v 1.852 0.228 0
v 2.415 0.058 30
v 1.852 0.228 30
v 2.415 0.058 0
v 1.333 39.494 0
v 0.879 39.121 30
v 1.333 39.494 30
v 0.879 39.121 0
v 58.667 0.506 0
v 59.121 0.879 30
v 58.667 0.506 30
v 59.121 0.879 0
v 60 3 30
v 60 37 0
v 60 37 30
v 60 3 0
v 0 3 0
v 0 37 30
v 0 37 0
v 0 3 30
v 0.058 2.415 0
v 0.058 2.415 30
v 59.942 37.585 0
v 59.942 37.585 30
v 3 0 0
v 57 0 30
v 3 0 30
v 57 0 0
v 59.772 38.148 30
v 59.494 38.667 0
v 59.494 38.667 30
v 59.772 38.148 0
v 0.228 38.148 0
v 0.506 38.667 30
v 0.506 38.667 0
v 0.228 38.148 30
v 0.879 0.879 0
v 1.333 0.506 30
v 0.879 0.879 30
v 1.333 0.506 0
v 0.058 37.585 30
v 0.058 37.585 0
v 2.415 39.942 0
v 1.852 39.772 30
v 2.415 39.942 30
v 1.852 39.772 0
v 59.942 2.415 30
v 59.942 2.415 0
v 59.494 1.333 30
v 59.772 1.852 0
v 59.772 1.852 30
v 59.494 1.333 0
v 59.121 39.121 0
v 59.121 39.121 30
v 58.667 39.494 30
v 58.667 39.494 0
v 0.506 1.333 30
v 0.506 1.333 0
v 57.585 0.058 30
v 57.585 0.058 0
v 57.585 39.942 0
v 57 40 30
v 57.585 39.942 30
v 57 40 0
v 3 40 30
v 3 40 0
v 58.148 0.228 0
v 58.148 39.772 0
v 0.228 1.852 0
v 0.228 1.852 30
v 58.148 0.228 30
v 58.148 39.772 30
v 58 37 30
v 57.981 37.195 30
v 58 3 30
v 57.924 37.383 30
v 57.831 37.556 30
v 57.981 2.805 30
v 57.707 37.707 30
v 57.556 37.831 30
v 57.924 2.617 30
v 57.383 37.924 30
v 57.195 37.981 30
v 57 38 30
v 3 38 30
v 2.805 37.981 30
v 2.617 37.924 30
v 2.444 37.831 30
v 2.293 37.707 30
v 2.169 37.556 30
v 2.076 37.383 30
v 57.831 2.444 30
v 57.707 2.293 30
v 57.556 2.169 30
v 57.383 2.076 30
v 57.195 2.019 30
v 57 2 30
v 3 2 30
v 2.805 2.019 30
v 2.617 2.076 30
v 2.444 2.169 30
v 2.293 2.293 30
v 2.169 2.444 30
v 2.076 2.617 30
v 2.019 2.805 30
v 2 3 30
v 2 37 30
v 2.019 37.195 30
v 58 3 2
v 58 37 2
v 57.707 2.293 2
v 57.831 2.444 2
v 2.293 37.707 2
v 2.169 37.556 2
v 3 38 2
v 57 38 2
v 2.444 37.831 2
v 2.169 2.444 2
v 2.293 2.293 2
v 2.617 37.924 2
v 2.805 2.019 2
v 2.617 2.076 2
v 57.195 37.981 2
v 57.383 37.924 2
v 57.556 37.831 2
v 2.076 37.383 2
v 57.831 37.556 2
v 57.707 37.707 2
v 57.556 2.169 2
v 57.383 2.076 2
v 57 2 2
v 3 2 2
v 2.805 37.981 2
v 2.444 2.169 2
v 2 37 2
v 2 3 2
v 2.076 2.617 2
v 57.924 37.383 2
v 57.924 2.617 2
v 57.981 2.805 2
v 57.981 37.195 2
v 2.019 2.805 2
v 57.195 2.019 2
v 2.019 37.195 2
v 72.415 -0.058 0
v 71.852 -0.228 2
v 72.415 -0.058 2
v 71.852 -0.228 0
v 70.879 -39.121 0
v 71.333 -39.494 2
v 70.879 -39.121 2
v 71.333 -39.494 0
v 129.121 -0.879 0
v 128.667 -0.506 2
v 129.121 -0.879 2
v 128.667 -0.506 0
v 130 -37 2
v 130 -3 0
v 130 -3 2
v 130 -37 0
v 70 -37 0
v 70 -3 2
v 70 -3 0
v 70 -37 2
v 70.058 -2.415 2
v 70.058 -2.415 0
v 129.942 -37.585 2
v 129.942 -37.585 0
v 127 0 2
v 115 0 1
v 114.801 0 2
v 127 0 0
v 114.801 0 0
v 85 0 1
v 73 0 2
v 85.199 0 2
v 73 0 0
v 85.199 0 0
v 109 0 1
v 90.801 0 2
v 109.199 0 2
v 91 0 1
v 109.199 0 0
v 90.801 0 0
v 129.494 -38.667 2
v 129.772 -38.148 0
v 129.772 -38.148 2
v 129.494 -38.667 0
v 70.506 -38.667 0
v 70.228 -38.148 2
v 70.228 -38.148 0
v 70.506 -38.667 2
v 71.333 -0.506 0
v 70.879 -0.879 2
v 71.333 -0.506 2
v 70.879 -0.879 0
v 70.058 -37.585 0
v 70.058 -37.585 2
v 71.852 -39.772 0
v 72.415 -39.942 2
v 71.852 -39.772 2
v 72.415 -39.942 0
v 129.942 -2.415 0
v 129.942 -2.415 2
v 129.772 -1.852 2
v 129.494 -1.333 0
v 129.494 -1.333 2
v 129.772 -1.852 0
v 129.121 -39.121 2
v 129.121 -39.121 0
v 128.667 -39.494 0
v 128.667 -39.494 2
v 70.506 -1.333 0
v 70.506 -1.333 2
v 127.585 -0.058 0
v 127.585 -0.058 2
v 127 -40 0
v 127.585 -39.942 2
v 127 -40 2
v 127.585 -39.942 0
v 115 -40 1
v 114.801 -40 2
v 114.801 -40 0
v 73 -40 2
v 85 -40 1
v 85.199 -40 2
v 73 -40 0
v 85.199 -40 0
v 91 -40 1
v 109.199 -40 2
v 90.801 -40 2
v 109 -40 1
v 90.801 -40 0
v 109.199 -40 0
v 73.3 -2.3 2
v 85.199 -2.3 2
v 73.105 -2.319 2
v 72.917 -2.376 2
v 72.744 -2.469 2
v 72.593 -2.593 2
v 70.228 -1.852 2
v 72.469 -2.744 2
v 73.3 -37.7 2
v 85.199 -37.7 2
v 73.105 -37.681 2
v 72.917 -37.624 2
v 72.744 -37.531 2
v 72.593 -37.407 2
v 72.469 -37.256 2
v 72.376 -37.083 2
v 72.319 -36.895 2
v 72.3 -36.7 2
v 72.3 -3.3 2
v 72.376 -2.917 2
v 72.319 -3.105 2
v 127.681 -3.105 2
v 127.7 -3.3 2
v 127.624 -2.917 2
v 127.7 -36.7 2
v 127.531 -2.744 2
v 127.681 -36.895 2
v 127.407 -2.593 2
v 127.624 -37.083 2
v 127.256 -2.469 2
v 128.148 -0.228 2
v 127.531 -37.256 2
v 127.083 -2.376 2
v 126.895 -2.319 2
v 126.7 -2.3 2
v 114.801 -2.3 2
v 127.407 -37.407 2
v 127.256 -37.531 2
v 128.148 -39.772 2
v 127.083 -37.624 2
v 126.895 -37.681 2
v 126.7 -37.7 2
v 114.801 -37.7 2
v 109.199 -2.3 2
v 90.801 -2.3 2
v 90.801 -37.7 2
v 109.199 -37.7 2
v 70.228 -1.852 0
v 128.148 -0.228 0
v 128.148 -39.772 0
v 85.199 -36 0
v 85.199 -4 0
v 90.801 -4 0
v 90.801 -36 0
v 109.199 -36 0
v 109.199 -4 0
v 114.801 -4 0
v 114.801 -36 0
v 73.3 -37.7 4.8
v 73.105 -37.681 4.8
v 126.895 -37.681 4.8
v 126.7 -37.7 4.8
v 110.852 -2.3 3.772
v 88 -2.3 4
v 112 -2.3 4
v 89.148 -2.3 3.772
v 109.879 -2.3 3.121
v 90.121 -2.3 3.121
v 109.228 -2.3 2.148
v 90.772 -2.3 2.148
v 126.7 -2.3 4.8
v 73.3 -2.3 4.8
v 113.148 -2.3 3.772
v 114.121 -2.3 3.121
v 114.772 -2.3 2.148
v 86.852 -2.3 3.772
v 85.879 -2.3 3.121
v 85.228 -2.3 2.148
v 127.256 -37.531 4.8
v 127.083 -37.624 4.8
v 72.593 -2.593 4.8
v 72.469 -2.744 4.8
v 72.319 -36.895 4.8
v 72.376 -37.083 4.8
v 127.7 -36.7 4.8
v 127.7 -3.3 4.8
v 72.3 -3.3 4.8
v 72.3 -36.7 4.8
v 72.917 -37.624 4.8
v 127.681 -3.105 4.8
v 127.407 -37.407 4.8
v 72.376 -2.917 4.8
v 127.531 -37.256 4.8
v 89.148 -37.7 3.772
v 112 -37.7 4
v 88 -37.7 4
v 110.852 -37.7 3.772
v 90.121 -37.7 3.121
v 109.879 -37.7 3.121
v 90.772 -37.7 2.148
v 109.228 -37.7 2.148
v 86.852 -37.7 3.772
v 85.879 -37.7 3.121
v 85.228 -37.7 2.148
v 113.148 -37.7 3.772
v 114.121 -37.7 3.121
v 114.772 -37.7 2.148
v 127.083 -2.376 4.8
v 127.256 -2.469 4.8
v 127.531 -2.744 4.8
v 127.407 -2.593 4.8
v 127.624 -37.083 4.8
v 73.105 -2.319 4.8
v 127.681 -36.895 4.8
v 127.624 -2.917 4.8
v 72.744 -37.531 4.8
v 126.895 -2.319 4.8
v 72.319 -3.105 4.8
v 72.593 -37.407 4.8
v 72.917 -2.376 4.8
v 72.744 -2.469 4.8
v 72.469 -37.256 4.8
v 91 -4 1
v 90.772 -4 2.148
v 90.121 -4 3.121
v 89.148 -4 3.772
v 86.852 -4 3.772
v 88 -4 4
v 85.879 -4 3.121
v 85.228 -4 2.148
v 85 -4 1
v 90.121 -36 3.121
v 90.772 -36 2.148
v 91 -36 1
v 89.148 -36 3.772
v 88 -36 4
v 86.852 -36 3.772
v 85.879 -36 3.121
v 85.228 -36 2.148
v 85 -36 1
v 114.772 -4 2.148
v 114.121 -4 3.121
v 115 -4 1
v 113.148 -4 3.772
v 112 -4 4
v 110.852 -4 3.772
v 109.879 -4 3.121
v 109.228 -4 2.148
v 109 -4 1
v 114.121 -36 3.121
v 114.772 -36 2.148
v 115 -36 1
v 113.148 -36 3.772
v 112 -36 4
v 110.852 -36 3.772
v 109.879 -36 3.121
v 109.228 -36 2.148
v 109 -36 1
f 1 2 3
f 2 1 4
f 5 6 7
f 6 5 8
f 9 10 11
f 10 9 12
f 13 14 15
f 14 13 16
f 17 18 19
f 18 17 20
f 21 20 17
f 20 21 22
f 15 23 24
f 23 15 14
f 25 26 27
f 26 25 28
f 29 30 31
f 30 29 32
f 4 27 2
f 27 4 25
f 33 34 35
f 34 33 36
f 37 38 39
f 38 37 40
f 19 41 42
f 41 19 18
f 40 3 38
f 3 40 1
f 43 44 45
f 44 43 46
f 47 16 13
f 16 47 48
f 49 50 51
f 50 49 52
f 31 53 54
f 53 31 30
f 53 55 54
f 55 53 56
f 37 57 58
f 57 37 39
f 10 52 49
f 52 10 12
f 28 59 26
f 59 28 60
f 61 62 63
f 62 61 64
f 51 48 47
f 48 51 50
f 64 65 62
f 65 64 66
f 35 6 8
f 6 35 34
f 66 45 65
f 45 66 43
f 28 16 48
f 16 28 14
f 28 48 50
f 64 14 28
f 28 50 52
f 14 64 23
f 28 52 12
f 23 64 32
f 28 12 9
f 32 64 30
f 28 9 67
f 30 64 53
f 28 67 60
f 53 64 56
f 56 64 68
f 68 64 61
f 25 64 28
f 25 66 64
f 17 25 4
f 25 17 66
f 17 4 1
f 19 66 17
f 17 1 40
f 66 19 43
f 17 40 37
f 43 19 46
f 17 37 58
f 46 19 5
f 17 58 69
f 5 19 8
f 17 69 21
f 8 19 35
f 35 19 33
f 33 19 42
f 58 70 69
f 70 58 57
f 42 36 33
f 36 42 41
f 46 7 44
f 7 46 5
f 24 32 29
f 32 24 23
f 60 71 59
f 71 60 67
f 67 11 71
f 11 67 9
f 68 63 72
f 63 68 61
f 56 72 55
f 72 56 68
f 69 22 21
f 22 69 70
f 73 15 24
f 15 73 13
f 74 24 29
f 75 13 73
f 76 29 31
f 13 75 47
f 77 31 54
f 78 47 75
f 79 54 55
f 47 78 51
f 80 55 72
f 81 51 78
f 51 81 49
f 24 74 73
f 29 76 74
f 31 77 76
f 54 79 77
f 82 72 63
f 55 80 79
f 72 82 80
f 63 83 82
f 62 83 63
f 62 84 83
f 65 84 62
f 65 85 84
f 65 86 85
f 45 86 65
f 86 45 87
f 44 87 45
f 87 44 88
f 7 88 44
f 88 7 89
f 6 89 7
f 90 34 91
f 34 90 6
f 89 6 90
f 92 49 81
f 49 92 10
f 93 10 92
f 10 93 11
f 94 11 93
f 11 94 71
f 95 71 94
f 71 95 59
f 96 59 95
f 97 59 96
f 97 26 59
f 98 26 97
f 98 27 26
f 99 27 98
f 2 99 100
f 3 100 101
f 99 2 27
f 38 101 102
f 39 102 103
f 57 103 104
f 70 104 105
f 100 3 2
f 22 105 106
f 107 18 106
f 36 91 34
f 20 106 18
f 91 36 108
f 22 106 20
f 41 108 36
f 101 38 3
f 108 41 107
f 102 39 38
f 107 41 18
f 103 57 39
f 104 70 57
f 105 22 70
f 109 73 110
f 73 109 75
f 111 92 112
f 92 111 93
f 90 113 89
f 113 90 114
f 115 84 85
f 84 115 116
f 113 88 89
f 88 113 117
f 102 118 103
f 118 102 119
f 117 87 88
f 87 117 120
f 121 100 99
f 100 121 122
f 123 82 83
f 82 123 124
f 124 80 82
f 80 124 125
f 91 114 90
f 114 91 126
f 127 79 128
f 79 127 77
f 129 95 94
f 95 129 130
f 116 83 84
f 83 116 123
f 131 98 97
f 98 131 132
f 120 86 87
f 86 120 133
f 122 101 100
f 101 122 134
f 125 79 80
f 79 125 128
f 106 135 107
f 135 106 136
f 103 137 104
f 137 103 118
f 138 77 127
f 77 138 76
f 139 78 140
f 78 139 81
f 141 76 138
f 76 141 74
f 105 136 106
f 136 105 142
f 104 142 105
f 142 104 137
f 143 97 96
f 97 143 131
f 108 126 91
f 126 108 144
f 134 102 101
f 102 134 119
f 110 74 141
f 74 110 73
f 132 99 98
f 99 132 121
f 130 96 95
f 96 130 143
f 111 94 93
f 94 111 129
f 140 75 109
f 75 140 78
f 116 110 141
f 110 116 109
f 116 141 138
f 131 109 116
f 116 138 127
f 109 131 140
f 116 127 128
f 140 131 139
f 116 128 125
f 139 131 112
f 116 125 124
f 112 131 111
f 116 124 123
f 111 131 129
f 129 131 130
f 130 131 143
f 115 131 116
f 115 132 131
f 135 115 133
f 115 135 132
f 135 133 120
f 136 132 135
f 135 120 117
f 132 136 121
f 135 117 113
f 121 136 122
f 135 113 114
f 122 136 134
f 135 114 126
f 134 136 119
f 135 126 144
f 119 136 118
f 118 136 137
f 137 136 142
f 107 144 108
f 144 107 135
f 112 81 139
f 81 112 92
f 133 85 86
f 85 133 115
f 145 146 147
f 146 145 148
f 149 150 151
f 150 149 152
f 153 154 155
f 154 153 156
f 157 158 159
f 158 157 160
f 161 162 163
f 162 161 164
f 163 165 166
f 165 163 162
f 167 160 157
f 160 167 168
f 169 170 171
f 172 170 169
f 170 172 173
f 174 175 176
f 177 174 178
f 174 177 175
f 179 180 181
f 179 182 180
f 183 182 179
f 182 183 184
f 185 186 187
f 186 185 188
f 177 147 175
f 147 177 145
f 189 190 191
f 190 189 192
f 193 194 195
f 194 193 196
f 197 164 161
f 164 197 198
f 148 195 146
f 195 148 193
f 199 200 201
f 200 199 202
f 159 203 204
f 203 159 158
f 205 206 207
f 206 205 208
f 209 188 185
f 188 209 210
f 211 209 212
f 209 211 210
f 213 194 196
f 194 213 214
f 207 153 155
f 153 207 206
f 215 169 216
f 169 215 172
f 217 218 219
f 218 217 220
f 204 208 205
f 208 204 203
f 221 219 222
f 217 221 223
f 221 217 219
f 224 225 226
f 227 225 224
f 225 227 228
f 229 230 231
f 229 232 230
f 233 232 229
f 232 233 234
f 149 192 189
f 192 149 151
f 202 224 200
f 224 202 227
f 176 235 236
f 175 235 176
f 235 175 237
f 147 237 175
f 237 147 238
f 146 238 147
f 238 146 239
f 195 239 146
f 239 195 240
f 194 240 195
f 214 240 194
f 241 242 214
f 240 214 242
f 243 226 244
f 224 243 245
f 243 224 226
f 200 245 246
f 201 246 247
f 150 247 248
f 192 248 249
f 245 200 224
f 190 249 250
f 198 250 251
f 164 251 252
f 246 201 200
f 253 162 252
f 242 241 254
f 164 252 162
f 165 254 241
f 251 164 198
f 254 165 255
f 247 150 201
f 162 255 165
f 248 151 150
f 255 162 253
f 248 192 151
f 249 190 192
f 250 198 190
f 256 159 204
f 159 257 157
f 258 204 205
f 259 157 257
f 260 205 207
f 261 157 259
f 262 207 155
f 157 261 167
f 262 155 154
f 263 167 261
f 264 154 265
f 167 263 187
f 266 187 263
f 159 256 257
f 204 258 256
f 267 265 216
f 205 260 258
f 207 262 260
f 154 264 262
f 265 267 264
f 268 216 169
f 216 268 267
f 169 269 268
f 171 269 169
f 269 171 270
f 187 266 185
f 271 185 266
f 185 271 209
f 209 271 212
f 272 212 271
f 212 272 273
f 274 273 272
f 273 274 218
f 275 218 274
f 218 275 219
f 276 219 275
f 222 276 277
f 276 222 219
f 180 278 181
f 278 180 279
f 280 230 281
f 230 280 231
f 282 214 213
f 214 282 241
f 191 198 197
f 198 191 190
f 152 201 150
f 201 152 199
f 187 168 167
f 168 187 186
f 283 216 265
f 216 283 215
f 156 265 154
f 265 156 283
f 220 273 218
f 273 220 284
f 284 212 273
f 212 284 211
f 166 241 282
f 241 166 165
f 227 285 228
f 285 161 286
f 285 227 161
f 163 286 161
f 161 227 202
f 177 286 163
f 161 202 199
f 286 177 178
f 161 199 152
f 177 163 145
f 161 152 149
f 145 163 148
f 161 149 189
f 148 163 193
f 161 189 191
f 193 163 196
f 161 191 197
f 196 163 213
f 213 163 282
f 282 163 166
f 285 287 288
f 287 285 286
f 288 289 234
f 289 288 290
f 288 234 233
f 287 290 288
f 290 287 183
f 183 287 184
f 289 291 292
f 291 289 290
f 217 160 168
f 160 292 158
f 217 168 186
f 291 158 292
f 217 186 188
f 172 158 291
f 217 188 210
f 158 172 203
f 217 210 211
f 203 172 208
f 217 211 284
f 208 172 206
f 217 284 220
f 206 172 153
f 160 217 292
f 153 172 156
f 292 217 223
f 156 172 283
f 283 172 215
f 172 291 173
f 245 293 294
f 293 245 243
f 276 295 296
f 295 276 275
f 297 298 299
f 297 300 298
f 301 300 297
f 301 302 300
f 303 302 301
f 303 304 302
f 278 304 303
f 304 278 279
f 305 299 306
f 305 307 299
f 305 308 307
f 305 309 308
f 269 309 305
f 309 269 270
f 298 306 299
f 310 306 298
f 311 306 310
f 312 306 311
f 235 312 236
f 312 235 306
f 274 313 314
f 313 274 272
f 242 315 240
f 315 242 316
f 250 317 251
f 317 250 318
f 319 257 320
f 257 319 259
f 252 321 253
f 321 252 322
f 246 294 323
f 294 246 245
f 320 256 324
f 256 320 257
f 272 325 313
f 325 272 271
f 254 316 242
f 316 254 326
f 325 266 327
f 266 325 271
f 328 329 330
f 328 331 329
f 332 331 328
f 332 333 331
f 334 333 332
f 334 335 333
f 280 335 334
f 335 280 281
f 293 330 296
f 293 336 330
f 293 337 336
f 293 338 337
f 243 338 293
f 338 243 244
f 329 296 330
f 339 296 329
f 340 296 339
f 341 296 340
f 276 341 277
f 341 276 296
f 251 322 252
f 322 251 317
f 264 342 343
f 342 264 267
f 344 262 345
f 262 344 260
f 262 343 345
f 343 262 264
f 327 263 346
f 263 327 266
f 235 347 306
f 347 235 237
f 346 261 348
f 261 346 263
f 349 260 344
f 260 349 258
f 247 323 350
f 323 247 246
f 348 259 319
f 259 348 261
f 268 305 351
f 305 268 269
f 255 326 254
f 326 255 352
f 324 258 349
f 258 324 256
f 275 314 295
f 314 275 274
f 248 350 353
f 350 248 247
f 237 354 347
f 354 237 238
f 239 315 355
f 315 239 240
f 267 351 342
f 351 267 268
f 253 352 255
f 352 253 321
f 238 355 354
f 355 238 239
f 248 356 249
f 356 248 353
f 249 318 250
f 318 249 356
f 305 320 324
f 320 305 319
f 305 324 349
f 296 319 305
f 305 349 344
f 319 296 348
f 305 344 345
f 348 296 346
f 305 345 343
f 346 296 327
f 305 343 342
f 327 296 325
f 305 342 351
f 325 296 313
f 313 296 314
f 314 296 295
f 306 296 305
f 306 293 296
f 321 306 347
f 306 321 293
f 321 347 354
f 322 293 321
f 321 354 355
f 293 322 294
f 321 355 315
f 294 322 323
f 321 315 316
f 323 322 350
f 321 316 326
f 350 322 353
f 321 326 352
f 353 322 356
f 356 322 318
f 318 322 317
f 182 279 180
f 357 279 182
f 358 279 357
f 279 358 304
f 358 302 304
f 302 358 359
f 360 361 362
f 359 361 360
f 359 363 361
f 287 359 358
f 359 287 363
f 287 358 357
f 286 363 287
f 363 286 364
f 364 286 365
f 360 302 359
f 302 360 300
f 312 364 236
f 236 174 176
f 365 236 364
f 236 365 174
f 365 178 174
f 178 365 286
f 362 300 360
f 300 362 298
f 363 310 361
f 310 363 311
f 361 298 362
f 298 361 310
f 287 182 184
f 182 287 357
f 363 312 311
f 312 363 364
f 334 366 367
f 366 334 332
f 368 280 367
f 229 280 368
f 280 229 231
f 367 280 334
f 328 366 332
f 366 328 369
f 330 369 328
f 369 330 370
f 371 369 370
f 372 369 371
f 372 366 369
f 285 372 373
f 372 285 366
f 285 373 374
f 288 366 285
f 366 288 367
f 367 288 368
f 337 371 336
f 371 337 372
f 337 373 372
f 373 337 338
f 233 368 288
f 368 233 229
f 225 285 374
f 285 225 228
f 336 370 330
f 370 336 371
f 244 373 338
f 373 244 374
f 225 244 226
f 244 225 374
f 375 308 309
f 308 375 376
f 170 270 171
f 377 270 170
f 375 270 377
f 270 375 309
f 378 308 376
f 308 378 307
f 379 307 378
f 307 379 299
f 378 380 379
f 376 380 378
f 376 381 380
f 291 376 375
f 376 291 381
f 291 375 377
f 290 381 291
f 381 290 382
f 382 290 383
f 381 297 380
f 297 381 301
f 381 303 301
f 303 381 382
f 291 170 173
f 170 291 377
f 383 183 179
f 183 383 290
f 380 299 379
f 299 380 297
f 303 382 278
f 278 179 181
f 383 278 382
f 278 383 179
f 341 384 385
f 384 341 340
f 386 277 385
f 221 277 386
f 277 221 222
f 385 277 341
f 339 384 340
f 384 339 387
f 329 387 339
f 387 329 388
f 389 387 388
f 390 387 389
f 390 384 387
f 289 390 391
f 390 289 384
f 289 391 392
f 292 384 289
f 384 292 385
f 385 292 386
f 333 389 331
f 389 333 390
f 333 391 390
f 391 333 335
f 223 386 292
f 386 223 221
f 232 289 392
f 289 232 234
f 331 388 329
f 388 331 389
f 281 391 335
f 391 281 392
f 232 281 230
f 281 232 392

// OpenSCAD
// Parametric Box with Lid
// A customizable storage box for 3D printing

// === Box Parameters ===
width = 60;              // [20:200] Width in mm
depth = 40;              // [20:200] Depth in mm
height = 30;             // [10:150] Height in mm
wall_thickness = 2;      // [1:0.5:5] Wall thickness in mm

// === Lid Parameters ===
include_lid = true;      // Include a separate lid
lid_height = 8;          // [5:30] Lid height in mm
lid_tolerance = 0.3;     // [0.1:0.1:0.8] Gap for lid fit

// === Style Options ===
corner_radius = 3;       // [0:10] Corner rounding radius
add_grip = true;         // Add grip indents to lid

// === Internal ===
$fn = 32;                // Smoothness

// Rounded box module
module rounded_box(w, d, h, r) {
    if (r > 0) {
        hull() {
            for (x = [r, w-r]) {
                for (y = [r, d-r]) {
                    translate([x, y, 0])
                        cylinder(h = h, r = r);
                }
            }
        }
    } else {
        cube([w, d, h]);
    }
}

// Main box body
module box_body() {
    difference() {
        rounded_box(width, depth, height, corner_radius);

        // Hollow inside
        translate([wall_thickness, wall_thickness, wall_thickness])
            rounded_box(
                width - 2*wall_thickness,
                depth - 2*wall_thickness,
                height,  // Open top
                max(0, corner_radius - wall_thickness)
            );
    }
}

// Lid
module lid() {
    inner_w = width - 2*wall_thickness - 2*lid_tolerance;
    inner_d = depth - 2*wall_thickness - 2*lid_tolerance;
    lip_height = lid_height * 0.6;

    difference() {
        union() {
            // Top cap
            rounded_box(width, depth, wall_thickness, corner_radius);

            // Inner lip
            translate([wall_thickness + lid_tolerance, wall_thickness + lid_tolerance, -lip_height + wall_thickness])
                rounded_box(inner_w, inner_d, lip_height, max(0, corner_radius - wall_thickness));
        }

        // Grip indents
        if (add_grip) {
            for (x = [width * 0.3, width * 0.7]) {
                translate([x, -1, wall_thickness/2])
                    rotate([-90, 0, 0])
                    cylinder(h = 5, r = 3, $fn = 16);
                translate([x, depth - 4, wall_thickness/2])
                    rotate([-90, 0, 0])
                    cylinder(h = 5, r = 3, $fn = 16);
            }
        }
    }
}

// Render
box_body();

if (include_lid) {
    // The flipped cap's outer face is at -wall_thickness.
    translate([width + 10, 0, wall_thickness])
        rotate([180, 0, 0])
        lid();
}
